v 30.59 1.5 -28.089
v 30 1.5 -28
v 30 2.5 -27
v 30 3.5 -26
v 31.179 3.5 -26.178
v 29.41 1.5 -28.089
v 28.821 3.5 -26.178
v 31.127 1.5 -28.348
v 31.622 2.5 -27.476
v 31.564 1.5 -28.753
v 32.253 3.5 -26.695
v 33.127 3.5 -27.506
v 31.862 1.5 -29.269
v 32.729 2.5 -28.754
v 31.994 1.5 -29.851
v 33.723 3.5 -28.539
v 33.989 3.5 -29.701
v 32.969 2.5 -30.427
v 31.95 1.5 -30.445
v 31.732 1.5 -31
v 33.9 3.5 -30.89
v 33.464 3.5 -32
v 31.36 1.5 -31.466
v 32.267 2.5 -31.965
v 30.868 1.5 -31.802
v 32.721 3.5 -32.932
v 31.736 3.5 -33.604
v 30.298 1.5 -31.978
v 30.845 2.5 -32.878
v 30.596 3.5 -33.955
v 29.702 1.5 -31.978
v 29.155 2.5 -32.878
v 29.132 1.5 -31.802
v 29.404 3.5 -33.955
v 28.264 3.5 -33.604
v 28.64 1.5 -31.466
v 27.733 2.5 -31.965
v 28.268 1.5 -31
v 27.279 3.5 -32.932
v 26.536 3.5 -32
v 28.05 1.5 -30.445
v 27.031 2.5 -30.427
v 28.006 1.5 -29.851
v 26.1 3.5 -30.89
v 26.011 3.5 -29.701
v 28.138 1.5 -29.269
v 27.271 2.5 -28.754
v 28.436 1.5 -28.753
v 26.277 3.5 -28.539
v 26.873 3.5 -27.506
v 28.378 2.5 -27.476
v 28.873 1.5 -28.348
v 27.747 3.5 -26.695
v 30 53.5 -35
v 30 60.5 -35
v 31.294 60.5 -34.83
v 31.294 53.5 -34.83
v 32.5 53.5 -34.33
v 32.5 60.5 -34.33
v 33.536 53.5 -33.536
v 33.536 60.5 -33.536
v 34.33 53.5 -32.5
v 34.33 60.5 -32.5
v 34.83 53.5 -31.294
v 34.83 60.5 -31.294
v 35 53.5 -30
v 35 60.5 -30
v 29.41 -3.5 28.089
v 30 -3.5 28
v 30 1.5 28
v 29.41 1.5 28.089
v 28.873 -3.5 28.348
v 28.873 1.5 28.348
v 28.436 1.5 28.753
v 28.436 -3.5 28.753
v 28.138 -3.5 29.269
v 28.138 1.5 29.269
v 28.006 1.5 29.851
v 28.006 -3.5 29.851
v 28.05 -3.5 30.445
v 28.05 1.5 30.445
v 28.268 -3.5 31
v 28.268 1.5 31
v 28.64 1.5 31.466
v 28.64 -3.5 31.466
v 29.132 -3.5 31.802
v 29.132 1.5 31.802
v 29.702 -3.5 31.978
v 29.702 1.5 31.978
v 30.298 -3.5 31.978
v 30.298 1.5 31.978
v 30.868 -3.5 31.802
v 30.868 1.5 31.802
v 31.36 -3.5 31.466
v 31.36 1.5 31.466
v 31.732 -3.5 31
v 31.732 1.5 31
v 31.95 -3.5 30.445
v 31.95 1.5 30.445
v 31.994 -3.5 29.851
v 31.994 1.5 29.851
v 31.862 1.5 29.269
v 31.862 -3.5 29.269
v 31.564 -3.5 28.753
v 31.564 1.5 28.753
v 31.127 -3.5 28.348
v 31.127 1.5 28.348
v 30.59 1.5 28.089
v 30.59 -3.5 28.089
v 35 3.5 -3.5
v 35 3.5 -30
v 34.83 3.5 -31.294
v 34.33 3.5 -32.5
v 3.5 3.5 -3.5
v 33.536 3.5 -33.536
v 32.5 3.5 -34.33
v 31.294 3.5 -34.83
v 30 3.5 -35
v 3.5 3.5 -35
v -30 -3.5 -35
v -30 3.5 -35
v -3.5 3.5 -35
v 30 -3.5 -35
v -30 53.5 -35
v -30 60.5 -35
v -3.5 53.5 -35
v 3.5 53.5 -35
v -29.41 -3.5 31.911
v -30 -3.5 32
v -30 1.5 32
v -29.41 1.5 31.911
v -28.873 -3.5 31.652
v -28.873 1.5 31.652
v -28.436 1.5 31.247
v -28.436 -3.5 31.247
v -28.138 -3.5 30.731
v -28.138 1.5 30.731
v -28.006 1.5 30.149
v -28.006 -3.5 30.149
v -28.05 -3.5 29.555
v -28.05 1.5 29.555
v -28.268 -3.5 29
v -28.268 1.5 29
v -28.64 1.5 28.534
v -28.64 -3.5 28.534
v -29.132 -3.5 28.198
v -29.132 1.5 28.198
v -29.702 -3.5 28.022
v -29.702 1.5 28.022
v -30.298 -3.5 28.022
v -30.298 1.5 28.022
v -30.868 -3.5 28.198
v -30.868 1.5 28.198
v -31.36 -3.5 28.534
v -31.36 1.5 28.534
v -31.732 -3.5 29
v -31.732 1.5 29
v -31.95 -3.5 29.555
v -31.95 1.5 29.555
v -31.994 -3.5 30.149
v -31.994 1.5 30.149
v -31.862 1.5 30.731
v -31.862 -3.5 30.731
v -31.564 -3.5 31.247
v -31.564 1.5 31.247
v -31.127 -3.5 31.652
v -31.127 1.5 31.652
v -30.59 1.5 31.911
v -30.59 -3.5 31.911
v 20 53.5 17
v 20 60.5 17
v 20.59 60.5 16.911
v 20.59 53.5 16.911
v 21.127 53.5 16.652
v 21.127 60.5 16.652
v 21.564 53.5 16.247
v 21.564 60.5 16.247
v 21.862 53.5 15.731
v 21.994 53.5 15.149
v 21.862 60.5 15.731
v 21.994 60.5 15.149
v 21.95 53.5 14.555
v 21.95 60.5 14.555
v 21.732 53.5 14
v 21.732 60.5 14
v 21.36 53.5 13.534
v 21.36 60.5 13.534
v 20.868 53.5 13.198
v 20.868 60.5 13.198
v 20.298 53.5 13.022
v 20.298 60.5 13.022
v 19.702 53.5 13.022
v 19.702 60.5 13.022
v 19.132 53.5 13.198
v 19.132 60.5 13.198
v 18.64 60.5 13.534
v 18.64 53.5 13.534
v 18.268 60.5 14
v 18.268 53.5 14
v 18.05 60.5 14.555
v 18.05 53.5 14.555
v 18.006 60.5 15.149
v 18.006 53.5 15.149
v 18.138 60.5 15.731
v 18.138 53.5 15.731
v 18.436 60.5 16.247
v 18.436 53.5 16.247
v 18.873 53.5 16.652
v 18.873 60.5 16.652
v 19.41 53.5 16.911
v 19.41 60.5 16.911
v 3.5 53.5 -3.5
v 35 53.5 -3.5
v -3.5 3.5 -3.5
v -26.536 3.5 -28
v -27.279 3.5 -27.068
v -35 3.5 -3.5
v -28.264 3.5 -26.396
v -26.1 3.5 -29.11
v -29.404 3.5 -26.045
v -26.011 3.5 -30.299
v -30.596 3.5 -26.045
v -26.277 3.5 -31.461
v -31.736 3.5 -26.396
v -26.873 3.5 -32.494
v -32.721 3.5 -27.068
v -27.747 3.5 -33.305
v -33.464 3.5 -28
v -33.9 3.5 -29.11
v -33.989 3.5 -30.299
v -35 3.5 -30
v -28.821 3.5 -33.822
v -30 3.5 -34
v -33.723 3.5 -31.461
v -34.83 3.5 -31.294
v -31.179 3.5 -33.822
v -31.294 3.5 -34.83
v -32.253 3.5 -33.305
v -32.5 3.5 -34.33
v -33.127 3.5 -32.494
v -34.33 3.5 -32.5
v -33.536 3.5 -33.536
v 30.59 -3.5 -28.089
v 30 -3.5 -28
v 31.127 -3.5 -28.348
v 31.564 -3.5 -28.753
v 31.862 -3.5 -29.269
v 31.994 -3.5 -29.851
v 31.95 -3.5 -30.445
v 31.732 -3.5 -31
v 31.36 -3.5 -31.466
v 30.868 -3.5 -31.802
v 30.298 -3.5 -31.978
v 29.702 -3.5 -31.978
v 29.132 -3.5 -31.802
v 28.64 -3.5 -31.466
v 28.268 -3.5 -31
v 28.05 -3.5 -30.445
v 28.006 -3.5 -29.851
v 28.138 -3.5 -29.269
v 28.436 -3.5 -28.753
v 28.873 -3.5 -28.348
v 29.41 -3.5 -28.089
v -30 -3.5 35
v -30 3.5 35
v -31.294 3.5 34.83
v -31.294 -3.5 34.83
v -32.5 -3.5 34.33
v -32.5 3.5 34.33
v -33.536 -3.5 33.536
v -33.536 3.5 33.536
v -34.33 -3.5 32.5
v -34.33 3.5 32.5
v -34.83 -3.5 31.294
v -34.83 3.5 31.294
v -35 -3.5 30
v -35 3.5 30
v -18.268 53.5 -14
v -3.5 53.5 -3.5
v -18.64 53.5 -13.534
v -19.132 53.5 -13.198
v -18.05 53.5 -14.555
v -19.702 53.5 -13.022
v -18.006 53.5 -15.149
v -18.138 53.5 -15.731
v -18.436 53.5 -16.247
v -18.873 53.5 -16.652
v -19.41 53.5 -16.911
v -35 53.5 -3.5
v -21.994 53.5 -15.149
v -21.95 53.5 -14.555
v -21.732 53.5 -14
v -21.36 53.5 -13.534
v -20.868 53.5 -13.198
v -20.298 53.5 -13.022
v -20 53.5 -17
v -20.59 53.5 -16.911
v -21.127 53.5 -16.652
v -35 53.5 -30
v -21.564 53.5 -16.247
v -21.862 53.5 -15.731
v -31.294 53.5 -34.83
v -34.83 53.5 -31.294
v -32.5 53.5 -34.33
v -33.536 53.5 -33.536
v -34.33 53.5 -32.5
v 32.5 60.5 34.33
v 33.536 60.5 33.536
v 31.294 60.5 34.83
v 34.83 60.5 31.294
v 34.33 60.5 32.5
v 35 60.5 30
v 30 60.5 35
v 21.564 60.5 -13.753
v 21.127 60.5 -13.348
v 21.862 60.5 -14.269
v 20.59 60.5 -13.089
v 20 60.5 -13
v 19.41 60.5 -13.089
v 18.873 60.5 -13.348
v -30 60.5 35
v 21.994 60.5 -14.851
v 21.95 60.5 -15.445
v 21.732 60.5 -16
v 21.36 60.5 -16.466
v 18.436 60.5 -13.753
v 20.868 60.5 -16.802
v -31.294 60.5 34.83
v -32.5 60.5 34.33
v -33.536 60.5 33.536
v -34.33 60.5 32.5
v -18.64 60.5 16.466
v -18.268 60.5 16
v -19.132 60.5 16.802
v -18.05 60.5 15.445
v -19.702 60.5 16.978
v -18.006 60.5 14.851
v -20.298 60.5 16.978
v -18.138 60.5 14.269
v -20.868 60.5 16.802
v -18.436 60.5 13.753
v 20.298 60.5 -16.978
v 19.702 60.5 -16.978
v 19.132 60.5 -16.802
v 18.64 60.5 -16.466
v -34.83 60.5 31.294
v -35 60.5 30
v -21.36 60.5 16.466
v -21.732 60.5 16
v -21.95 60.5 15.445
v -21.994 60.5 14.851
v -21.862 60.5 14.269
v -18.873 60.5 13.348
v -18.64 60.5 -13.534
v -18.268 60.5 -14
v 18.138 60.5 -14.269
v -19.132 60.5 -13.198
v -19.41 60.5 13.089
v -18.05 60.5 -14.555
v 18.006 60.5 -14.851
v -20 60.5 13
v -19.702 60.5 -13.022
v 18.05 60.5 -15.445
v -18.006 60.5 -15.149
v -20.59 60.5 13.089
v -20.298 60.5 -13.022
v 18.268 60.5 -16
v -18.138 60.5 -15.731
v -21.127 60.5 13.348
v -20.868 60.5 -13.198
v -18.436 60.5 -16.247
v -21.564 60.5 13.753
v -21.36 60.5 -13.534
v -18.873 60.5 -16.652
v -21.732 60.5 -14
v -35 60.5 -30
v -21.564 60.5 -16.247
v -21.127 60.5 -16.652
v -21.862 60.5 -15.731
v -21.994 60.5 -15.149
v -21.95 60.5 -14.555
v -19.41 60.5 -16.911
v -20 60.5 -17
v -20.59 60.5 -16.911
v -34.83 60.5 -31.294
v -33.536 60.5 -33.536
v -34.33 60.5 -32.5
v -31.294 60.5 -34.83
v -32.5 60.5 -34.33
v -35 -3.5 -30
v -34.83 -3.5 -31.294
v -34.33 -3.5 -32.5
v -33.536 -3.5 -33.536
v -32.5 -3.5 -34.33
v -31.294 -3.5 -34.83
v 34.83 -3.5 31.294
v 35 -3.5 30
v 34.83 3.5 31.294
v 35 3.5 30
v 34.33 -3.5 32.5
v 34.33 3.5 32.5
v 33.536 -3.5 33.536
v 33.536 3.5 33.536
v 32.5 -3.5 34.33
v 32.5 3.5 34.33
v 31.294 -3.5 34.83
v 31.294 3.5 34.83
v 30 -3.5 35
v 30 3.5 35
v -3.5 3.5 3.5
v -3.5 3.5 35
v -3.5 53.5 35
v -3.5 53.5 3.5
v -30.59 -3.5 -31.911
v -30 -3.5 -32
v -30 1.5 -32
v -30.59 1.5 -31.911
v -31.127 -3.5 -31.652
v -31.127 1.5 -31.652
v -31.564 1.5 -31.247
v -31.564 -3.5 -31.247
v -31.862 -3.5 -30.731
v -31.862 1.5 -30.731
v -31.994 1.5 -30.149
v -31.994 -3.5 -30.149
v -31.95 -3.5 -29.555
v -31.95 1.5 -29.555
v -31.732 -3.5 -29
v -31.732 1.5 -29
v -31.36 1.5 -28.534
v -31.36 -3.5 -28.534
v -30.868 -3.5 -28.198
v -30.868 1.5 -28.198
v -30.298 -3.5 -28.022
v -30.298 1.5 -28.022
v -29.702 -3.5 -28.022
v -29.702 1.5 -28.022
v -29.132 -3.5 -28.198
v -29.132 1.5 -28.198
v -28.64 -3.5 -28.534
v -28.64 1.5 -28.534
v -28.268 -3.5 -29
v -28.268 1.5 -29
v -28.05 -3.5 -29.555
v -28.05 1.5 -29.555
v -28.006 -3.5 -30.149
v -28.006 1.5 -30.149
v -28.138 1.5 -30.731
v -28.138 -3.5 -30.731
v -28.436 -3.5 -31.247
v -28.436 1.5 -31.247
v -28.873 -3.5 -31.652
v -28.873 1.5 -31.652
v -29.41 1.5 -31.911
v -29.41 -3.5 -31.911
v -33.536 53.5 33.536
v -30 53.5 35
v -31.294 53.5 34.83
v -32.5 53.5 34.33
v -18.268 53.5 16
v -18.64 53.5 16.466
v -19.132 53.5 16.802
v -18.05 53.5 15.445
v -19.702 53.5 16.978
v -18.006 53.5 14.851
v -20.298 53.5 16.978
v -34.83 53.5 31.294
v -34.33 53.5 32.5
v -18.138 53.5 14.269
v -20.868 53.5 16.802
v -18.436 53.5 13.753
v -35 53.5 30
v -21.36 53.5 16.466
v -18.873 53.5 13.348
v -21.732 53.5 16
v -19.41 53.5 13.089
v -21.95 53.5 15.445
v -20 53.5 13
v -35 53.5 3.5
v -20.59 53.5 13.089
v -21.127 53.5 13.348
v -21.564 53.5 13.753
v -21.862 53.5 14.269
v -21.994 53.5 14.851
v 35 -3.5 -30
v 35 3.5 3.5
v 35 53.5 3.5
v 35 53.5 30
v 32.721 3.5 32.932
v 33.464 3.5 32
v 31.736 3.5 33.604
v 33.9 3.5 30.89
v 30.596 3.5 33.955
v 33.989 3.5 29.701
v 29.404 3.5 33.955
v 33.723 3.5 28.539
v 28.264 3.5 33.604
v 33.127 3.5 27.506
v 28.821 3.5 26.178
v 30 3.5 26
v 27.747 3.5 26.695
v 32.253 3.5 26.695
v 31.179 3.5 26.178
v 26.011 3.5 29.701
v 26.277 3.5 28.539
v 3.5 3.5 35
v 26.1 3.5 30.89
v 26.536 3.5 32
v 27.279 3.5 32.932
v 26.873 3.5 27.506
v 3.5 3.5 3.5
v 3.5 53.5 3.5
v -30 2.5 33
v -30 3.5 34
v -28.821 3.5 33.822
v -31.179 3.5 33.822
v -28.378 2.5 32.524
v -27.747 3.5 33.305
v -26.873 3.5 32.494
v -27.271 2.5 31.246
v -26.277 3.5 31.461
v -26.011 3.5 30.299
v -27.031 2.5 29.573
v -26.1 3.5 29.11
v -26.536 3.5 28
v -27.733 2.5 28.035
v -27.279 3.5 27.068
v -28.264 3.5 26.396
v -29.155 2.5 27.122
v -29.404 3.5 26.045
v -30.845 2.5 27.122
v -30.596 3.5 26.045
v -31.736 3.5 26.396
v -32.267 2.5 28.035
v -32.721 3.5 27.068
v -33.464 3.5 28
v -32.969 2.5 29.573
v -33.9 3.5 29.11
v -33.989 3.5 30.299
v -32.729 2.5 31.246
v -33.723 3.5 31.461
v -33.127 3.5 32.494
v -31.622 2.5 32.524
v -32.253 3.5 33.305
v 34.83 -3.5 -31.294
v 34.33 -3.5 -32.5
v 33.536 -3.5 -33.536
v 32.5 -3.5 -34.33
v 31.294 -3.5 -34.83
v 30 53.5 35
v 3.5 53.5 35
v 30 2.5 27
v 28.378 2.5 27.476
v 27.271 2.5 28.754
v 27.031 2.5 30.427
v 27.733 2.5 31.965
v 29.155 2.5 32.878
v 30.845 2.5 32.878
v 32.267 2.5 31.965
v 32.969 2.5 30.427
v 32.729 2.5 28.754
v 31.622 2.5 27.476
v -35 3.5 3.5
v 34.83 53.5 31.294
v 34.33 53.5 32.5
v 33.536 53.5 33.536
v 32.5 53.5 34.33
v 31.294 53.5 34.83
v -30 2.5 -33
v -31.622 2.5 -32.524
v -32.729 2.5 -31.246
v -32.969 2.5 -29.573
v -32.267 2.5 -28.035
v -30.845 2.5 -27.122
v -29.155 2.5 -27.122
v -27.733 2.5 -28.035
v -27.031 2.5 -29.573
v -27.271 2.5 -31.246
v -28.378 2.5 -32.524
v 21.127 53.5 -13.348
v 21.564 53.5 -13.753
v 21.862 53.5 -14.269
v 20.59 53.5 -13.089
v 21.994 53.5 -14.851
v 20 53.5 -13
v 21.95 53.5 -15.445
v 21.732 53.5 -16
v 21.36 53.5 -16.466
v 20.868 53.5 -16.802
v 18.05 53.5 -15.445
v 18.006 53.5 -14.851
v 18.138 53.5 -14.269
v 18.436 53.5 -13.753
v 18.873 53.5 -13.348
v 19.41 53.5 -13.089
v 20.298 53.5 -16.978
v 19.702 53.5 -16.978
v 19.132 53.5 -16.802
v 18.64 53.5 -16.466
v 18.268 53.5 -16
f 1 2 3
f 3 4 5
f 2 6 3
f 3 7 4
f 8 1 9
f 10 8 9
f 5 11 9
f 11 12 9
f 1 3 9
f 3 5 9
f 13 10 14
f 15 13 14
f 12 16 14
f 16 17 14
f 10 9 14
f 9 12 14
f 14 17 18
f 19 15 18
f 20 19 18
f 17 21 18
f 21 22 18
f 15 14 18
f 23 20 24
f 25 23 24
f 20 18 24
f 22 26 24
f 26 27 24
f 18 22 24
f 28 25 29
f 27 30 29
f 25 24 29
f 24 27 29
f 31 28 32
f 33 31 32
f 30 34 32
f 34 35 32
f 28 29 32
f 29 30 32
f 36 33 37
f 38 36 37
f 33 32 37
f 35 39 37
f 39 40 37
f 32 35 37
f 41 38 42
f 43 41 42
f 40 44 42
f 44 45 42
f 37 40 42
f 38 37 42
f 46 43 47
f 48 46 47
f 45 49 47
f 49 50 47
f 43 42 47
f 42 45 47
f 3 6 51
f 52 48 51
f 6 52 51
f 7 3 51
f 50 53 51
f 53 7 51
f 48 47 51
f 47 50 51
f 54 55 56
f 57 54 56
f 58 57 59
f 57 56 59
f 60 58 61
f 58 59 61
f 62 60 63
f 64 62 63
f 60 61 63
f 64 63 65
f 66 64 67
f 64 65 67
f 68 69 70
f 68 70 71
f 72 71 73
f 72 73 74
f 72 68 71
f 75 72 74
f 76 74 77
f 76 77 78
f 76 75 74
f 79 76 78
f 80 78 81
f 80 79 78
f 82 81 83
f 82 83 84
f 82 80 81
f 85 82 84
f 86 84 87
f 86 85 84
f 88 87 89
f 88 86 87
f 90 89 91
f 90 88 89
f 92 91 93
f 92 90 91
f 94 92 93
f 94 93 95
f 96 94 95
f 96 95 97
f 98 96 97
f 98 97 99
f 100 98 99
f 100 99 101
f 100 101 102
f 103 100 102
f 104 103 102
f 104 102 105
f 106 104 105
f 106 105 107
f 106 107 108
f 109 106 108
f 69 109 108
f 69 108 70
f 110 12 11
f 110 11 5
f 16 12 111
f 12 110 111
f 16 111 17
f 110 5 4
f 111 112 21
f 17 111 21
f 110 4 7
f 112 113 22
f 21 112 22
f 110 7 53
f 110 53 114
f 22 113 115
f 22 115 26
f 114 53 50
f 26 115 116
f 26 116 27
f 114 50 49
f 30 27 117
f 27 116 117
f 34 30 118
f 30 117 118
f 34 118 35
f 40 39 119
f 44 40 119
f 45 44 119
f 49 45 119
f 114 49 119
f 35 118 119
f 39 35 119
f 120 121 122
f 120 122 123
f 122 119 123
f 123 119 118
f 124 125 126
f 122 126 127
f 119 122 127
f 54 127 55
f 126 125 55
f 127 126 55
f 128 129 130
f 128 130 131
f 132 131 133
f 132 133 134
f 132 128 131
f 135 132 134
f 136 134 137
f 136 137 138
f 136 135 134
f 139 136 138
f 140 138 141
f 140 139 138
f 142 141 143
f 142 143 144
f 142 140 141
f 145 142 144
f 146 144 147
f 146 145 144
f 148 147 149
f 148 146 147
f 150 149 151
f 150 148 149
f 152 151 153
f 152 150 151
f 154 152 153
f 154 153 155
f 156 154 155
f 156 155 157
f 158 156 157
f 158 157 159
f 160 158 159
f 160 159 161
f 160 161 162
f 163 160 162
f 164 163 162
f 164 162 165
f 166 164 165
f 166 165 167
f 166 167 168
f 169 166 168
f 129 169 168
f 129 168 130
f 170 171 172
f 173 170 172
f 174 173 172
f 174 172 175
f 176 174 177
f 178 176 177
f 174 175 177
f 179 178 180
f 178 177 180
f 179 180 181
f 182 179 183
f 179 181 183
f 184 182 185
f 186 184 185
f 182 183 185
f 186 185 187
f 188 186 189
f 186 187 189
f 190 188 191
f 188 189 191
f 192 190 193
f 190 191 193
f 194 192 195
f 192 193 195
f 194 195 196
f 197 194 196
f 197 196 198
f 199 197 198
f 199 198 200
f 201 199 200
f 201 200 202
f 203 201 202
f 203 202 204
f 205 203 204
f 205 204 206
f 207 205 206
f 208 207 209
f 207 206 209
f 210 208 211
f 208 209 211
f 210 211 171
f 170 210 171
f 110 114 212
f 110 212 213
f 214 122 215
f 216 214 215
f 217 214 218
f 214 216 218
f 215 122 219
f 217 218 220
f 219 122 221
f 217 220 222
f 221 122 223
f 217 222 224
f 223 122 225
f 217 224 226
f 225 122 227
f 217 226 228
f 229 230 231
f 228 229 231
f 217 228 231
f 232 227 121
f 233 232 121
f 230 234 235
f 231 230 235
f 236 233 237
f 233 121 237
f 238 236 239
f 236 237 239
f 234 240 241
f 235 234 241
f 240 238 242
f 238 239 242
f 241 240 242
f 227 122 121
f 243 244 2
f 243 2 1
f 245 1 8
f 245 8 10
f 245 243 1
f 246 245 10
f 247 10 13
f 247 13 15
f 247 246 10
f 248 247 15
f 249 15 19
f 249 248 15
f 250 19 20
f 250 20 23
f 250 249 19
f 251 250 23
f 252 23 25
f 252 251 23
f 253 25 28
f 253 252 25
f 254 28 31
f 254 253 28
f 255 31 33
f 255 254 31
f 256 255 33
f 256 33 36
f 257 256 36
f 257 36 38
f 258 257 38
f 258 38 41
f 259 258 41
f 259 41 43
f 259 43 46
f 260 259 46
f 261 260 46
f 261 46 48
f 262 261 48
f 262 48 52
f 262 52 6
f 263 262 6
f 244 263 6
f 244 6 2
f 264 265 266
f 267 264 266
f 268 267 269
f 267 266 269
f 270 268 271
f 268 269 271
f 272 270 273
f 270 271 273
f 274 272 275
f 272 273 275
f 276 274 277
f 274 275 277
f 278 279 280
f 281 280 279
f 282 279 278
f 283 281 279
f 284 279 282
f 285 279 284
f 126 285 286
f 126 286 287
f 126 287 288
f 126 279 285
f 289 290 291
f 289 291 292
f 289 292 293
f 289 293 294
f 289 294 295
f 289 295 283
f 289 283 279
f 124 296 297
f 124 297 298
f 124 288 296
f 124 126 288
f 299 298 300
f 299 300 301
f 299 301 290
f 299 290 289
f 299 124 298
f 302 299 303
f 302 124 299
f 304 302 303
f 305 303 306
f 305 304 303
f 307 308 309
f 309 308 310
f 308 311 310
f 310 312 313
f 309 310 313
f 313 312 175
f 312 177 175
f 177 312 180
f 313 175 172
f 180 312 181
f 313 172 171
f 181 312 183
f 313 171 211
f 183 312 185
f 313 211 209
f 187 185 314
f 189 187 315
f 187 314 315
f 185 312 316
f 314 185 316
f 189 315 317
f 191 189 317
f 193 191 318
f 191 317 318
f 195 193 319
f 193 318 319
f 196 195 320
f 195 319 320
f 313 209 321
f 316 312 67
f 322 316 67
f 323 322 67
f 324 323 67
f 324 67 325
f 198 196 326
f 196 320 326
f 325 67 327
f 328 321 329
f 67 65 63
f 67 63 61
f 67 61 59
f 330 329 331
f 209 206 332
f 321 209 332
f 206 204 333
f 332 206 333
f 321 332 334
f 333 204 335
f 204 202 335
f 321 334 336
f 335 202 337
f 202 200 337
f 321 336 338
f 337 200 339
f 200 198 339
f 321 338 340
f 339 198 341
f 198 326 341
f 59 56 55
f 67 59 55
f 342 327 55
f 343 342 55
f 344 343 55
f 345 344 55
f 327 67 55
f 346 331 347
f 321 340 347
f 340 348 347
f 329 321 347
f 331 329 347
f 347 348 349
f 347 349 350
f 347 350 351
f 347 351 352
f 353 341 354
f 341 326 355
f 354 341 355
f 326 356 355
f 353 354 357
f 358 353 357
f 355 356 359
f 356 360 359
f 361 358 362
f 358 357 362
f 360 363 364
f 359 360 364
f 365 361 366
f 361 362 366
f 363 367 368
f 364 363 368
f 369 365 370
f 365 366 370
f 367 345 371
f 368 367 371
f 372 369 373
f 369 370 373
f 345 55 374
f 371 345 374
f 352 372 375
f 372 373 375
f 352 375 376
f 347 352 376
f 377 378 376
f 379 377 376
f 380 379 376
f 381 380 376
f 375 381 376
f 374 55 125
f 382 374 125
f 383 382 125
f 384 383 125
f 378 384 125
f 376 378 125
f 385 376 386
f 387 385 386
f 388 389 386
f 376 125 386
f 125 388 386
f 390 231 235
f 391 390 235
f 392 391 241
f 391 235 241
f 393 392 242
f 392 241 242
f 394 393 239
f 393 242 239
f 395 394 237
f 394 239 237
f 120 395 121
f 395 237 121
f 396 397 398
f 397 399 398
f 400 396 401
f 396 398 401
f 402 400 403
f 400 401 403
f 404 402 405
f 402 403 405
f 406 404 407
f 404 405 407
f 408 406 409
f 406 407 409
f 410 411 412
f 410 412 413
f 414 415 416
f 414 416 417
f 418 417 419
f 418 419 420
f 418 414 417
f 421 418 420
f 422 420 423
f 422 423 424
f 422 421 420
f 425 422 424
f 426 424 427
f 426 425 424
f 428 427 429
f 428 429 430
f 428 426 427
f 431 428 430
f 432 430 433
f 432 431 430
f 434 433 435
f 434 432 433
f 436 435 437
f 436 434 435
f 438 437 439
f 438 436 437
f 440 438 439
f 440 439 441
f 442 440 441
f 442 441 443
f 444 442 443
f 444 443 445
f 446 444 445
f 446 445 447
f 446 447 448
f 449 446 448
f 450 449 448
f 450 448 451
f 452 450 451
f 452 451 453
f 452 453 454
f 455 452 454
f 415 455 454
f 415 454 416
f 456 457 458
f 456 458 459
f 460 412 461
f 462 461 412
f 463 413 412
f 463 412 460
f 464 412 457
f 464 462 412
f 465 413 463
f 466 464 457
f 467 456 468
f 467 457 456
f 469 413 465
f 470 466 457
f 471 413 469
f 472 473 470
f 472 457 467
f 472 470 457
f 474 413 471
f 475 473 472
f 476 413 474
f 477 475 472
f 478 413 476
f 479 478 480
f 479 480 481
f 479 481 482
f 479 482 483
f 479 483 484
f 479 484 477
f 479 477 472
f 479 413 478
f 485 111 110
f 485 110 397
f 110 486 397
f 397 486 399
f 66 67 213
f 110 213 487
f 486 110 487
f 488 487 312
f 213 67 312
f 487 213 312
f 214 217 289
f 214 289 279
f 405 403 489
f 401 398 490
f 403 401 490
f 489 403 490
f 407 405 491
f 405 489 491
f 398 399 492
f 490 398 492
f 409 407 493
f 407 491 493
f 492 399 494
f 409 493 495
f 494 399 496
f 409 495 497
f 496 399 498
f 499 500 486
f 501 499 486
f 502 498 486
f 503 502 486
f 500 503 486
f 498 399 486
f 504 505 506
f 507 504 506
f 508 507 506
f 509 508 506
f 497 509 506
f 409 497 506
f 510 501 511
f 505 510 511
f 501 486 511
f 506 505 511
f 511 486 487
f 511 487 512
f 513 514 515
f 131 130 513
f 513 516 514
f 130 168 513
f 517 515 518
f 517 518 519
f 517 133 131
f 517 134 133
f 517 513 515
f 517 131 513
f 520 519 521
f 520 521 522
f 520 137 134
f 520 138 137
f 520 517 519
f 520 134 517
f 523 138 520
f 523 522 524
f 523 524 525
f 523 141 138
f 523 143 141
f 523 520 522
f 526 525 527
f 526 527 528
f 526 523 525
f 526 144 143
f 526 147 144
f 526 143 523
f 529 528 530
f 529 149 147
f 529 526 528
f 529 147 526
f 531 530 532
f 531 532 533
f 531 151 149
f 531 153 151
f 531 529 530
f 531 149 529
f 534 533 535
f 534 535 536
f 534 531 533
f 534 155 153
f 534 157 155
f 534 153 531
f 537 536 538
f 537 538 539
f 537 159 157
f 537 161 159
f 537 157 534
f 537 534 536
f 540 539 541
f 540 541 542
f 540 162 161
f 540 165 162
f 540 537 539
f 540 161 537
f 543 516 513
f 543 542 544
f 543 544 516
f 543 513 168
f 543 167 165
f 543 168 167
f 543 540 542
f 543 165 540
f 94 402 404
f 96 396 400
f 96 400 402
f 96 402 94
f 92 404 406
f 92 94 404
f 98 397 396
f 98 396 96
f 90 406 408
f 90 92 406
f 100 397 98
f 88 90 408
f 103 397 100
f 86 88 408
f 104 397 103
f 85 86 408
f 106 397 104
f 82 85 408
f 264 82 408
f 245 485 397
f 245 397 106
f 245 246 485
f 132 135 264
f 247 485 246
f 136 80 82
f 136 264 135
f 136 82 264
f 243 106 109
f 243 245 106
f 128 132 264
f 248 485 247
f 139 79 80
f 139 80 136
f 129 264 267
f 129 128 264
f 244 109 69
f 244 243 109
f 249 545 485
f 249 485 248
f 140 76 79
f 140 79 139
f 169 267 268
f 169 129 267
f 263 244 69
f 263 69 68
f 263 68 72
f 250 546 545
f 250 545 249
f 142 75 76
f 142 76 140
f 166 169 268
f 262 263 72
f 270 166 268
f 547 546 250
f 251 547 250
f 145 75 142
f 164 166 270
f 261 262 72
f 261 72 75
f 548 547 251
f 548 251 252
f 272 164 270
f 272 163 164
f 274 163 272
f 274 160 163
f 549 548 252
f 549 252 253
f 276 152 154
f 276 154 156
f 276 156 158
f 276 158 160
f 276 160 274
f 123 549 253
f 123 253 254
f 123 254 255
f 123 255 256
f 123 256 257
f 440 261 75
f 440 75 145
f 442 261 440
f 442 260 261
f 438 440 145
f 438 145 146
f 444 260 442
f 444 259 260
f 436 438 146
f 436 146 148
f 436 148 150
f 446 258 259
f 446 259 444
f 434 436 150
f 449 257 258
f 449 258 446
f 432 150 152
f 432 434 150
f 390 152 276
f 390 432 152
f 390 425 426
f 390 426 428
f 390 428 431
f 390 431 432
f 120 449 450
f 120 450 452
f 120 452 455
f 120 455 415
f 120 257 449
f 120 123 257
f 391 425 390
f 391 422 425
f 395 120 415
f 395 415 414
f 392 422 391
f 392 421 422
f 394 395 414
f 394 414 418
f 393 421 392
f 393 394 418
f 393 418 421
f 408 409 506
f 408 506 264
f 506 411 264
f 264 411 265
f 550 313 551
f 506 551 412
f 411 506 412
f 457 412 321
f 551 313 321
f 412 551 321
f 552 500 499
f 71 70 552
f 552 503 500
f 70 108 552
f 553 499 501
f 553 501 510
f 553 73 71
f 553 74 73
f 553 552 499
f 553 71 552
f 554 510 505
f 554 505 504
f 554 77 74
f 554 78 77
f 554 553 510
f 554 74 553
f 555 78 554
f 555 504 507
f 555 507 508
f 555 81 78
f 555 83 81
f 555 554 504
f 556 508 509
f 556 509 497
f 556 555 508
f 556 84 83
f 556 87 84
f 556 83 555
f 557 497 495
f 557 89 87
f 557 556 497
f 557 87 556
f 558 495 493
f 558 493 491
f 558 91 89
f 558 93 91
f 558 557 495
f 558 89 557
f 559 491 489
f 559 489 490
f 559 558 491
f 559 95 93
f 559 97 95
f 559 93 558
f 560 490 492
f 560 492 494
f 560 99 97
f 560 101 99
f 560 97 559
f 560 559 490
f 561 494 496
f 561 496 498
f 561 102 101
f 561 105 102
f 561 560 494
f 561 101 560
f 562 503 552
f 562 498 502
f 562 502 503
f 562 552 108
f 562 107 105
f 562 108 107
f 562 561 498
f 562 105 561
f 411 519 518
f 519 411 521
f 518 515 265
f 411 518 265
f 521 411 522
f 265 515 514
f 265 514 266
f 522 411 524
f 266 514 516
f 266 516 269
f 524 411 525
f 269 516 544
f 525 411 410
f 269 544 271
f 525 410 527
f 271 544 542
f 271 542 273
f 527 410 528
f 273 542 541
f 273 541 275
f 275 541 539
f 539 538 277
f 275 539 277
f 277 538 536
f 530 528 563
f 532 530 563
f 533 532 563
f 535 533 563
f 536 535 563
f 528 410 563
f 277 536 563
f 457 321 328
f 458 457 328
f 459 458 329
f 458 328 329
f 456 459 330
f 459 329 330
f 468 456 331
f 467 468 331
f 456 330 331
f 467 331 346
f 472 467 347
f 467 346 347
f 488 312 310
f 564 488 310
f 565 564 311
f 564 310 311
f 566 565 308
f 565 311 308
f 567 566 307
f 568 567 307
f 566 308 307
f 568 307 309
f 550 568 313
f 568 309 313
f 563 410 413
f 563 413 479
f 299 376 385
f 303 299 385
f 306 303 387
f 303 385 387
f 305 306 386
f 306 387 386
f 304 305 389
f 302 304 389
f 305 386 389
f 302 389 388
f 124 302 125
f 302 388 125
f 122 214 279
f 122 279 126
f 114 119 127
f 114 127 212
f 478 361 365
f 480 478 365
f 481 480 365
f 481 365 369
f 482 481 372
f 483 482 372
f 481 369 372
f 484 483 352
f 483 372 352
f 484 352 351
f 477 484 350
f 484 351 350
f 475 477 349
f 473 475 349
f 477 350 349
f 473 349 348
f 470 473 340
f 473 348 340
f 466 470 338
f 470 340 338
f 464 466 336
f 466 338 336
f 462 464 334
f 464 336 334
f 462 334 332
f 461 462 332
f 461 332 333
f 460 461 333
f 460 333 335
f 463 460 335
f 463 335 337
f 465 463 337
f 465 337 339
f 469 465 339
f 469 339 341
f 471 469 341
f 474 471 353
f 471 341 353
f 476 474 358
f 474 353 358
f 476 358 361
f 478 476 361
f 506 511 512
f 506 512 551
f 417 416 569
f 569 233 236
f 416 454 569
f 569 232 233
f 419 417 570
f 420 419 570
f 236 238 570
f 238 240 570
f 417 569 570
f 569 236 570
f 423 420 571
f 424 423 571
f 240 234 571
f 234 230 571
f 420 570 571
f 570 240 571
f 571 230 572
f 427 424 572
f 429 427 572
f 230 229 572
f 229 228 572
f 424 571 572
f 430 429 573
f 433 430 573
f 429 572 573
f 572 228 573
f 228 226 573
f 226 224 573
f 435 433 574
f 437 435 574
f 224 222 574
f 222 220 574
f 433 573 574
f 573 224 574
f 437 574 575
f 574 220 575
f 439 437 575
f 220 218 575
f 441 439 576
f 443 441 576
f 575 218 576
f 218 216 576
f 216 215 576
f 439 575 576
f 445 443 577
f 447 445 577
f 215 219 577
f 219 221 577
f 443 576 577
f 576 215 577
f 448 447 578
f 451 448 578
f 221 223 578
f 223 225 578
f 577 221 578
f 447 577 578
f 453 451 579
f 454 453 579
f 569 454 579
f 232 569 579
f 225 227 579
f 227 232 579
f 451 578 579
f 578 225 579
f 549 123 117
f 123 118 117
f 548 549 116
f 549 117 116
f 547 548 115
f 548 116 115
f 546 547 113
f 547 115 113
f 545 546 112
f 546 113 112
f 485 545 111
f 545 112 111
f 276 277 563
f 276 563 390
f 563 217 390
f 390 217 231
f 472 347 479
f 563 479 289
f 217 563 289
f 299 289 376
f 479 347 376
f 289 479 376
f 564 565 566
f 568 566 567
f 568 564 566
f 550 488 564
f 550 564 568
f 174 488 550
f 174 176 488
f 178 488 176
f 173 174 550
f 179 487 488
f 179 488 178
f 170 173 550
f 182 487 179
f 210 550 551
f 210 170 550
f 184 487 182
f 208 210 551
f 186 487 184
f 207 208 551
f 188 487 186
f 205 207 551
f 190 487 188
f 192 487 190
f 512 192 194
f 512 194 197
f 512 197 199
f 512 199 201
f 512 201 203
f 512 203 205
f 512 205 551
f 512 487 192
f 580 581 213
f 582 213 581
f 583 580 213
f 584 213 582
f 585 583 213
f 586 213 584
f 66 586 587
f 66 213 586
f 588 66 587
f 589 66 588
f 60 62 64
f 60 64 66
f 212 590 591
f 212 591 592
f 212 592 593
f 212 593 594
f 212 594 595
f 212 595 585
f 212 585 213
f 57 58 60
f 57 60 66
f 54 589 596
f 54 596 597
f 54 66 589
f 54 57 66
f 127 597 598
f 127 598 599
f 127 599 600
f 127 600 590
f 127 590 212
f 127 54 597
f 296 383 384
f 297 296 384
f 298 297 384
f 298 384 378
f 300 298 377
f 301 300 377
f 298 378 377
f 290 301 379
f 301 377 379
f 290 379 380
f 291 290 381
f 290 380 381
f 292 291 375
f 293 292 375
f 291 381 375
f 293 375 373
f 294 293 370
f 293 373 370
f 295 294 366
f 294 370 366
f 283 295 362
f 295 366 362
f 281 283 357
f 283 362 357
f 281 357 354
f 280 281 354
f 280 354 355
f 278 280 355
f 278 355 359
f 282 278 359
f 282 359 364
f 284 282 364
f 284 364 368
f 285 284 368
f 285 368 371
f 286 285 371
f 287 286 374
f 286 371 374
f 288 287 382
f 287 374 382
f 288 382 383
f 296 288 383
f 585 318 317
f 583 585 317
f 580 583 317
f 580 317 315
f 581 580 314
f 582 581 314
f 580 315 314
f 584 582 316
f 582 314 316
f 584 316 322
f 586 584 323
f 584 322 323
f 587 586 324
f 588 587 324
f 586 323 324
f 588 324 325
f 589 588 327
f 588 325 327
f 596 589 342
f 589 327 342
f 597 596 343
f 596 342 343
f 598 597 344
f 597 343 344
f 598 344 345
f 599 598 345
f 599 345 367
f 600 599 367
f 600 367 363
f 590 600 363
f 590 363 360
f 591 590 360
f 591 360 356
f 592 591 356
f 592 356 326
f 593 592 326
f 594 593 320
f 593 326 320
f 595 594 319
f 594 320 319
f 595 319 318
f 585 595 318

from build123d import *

# Parameters (mm, degrees)
SKETCH1_R           = 2
BOSS_EXTRUDE1_DEPTH = 3.5
BOSS_EXTRUDE2_DEPTH = 50
BOSS_EXTRUDE3_START = 7
SKETCH3_R           = 2
BOSS_EXTRUDE3_DEPTH = 7
CHAMFER1_SIZE       = 2


with BuildPart() as part:
    # Sketch1 → Boss-Extrude1 (new, symmetric)
    with BuildSketch(Plane(origin=(0, 0, 0), x_dir=(1, 0, 0), z_dir=(0, 1, 0))):
        with BuildLine():
            Line((-30, 35), (30, 35))
            ThreePointArc((30, 35), (33.535533906, 33.535533906), (35, 30))
            Line((35, 30), (35, -30))
            ThreePointArc((35, -30), (33.535533906, -33.535533906), (30, -35))
            Line((30, -35), (-30, -35))
            ThreePointArc((-30, -35), (-33.535533906, -33.535533906), (-35, -30))
            Line((-35, -30), (-35, 30))
            ThreePointArc((-35, 30), (-33.535533906, 33.535533906), (-30, 35))
        make_face()
        with Locations(Location((30, 30, 0), (0, 0, 270))):
            Circle(SKETCH1_R, mode=Mode.SUBTRACT)
        with Locations(Location((-30, 30, 0), (0, 0, 90))):
            Circle(SKETCH1_R, mode=Mode.SUBTRACT)
        with Locations(Location((30, -30, 0), (0, 0, 90))):
            Circle(SKETCH1_R, mode=Mode.SUBTRACT)
        with Locations(Location((-30, -30, 0), (0, 0, 270))):
            Circle(SKETCH1_R, mode=Mode.SUBTRACT)
    extrude(amount=BOSS_EXTRUDE1_DEPTH, both=True)

    # Sketch2 → Boss-Extrude2 (add)
    with BuildSketch(Plane(origin=(0, 3.5, 0), x_dir=(1, 0, 0), z_dir=(0, 1, 0))):
        Polygon((-3.5, 35), (3.5, 35), (3.5, 3.5), (35, 3.5), (35, -3.5), (3.5, -3.5), (3.5, -35), (-3.5, -35), (-3.5, -3.5), (-35, -3.5), (-35, 3.5), (-3.5, 3.5), align=None)
    extrude(amount=BOSS_EXTRUDE2_DEPTH)

    # Sketch3 → Boss-Extrude3 (add)
    with BuildSketch(Plane(origin=(0, 53.5, 0), x_dir=(1, 0, 0), z_dir=(0, 1, 0)).offset(BOSS_EXTRUDE3_START)):
        with BuildLine():
            Line((30, -35), (-30, -35))
            ThreePointArc((-30, -35), (-33.535533906, -33.535533906), (-35, -30))
            Line((-35, -30), (-35, 30))
            ThreePointArc((-35, 30), (-33.535533906, 33.535533906), (-30, 35))
            Line((-30, 35), (30, 35))
            ThreePointArc((30, 35), (33.535533906, 33.535533906), (35, 30))
            Line((35, 30), (35, -30))
            ThreePointArc((35, -30), (33.535533906, -33.535533906), (30, -35))
        make_face()
        with Locations(Location((20, -15, 0), (0, 0, 270))):
            Circle(SKETCH3_R, mode=Mode.SUBTRACT)
        with Locations(Location((20, 15, 0), (0, 0, 270))):
            Circle(SKETCH3_R, mode=Mode.SUBTRACT)
        with Locations(Location((-20, 15, 0), (0, 0, 90))):
            Circle(SKETCH3_R, mode=Mode.SUBTRACT)
        with Locations(Location((-20, -15, 0), (0, 0, 90))):
            Circle(SKETCH3_R, mode=Mode.SUBTRACT)
    extrude(amount=-BOSS_EXTRUDE3_DEPTH)

    # Chamfer1
    chamfer1_edges = [part.edges().sort_by_distance(p)[0] for p in [
        (30, 3.5, -32),
        (-30, 3.5, -28),
        (30, 3.5, 32),
        (-30, 3.5, 28),
    ]]
    chamfer(chamfer1_edges, length=CHAMFER1_SIZE)


solid = part.part
